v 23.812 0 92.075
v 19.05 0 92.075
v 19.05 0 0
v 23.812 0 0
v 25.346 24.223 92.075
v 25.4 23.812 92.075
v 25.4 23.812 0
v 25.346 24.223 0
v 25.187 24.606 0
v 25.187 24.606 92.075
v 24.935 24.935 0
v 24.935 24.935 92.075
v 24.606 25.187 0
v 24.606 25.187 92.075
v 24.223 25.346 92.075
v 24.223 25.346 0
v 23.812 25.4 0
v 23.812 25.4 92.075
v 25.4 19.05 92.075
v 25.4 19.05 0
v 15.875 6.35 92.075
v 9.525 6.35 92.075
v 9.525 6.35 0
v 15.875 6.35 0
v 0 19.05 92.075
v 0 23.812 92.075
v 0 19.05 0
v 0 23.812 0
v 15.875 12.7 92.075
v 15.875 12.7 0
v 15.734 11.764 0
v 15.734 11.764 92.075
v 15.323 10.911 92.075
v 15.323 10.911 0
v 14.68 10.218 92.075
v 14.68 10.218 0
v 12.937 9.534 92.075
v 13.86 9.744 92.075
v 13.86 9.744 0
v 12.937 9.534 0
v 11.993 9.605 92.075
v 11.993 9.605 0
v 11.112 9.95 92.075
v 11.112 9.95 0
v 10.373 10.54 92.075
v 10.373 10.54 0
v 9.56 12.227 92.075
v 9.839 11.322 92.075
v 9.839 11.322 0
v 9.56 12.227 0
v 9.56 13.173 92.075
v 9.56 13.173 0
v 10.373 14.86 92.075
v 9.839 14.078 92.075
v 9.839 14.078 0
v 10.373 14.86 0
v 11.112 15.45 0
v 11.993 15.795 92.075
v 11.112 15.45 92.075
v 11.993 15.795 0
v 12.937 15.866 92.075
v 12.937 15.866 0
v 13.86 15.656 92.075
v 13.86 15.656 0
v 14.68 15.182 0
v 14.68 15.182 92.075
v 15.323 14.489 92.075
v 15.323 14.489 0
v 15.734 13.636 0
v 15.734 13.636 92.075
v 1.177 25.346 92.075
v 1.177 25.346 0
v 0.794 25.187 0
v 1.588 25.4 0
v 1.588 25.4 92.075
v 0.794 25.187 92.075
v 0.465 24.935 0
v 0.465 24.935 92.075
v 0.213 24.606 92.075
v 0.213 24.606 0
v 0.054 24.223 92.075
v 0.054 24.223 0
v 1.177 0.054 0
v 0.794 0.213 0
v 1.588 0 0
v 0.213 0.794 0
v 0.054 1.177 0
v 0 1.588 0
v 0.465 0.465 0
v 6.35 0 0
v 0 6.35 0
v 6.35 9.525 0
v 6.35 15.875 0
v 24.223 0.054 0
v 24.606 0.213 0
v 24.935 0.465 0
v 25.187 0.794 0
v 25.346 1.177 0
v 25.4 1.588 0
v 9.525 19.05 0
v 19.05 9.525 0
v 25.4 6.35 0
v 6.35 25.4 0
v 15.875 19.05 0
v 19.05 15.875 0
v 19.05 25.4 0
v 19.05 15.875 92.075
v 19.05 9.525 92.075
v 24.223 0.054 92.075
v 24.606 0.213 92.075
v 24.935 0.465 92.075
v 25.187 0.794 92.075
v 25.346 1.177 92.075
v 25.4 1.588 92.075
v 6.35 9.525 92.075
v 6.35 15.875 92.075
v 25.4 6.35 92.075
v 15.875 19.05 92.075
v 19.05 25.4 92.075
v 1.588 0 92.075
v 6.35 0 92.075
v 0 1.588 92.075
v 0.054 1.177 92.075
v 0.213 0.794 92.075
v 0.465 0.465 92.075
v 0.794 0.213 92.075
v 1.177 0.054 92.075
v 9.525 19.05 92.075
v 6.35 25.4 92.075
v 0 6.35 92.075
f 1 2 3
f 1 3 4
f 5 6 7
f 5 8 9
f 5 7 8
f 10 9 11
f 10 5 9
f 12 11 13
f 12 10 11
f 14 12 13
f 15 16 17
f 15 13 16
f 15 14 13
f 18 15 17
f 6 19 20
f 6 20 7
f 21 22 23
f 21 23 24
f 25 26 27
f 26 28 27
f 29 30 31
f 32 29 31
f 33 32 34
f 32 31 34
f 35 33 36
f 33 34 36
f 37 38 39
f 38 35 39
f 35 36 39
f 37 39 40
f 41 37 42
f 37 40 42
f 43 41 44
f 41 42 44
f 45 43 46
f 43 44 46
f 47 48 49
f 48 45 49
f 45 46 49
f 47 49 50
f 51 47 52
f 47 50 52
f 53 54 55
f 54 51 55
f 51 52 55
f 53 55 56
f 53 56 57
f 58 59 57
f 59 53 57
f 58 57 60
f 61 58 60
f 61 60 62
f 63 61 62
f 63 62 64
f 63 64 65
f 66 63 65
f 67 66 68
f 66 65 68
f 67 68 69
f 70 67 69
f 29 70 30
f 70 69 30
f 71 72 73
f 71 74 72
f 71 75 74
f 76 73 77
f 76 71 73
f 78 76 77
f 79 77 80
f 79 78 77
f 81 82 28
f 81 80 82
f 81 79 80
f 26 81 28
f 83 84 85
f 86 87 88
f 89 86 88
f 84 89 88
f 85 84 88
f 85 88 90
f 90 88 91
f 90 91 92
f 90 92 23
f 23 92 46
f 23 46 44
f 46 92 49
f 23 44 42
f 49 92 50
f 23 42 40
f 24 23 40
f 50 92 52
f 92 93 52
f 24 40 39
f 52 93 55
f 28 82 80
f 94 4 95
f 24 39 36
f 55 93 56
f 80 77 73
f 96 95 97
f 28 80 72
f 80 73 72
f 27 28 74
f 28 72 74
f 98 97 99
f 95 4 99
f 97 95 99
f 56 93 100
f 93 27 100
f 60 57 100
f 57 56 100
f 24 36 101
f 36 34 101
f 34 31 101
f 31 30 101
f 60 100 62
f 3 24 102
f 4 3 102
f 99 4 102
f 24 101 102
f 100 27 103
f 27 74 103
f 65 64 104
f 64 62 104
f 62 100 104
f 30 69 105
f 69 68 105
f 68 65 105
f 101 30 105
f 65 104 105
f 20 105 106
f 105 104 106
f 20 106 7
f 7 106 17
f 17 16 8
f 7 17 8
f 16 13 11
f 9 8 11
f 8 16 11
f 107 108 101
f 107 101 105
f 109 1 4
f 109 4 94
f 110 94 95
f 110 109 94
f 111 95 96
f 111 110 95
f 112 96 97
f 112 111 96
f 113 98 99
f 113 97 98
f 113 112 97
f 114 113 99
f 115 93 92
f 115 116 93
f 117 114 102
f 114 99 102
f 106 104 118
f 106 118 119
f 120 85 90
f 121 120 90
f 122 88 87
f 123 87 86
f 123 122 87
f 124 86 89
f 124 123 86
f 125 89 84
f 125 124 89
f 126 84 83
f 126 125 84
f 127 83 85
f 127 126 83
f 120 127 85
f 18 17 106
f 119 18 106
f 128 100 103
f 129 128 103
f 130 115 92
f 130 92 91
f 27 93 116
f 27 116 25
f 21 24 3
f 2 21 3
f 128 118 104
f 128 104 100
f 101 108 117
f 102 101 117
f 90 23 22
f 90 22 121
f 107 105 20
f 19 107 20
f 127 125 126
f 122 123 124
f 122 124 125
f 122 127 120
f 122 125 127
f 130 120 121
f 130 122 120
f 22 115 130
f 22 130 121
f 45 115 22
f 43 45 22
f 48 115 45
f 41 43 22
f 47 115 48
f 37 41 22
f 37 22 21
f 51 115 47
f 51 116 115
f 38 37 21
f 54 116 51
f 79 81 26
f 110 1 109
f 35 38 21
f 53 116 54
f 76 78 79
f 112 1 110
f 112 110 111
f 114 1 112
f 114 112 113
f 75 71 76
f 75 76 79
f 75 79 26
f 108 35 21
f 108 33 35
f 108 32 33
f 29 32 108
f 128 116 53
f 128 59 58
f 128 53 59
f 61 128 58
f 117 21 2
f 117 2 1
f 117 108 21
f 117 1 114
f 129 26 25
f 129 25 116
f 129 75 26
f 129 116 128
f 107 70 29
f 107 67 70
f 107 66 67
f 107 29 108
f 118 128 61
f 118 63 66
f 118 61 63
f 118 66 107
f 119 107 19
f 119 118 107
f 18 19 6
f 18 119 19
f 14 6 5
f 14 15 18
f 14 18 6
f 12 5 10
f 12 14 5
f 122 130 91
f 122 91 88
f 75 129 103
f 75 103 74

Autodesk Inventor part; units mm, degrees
ref_plane "YZ Plane" through (0, 0, 0) normal (1, 0, 0) x (0, 1, 0)
ref_plane "XZ Plane" through (0, 0, 0) normal (0, 1, 0) x (-1, 0, 0)
ref_plane "XY Plane" through (0, 0, 0) normal (0, 0, 1) x (1, 0, 0)
sketch "Sketch1" plane through (0, 0, 0) normal (0, 0, 1) x (1, 0, 0)
  line L0 (0, 0) -> (25.4, 0)
  line L1 (25.4, 0) -> (25.4, 25.4)
  line L2 (25.4, 25.4) -> (0, 25.4)
  line L3 (0, 25.4) -> (0, 0)
  circle A0 centre (12.7, 12.7) radius 3.175
  dimension "d0" = 25.4
  dimension "d1" = 25.4
  dimension "d2" = 6.35
  dimension "d7" = 12.7
  dimension "d8" = 12.7
extrude "Extrusion1" add sketch "Sketch1" along normal blind 609.6
sketch "Sketch2" plane through (0, 0, 609.6) normal (0, 0, 1) x (1, 0, 0)
  line L0 (25.4, 25.4) -> (0, 25.4) projected
  line L1 (0, 25.4) -> (0, 0) projected
  circle A0 centre (12.7, 12.7) radius 3.175 projected
  line L2 (0, 0) -> (25.4, 0) projected
  line L3 (25.4, 0) -> (25.4, 25.4) projected
  line L4 (25.4, 25.4) -> (0, 25.4) projected
  line L5 (0, 25.4) -> (0, 0) projected
  line L6 (12.7, 19.05) -> (9.525, 19.05)
  line L7 (9.525, 19.05) -> (15.875, 19.05)
  line L8 (15.875, 19.05) -> (19.05, 25.4)
  line L9 (9.525, 19.05) -> (6.35, 25.4)
  dimension "d13" = 6.35
  dimension "d14" = 6.35
  dimension "d15" = 3.175
  dimension "d16" = 6.35
fillet "Fillet1" radius 1.5875 4 edges at (25.4, 25.4, 304.8) (0, 25.4, 304.8) (25.4, 0, 304.8) (0, 0, 304.8)
extrude "Extrusion2" cut sketch "Sketch2" against normal blind 609.6 contours L8 L7 L6 L9 L0
pattern_circular "Circular Pattern1" count 4 over 360 about axis through (12.7, 12.7, 0) along (0, 0, 1) of "Extrusion2"
sketch "Sketch3" plane through (0, 0, 609.6) normal (0, 0, 1) x (1, 0, 0)
  line L0 (19.05, 15.875) -> (25.4, 19.05) projected
  line L1 (25.4, 19.05) -> (25.4, 23.8125) projected
  arc A0 (25.4, 23.8125) -> (23.8125, 25.4) centre (23.8125, 23.8125) ccw projected
  line L2 (23.8125, 25.4) -> (19.05, 25.4) projected
  line L3 (19.05, 25.4) -> (15.875, 19.05) projected
  line L4 (15.875, 19.05) -> (9.525, 19.05) projected
  line L5 (9.525, 19.05) -> (6.35, 25.4) projected
  line L6 (6.35, 25.4) -> (1.5875, 25.4) projected
  arc A1 (1.5875, 25.4) -> (0, 23.8125) centre (1.5875, 23.8125) ccw projected
  line L7 (0, 23.8125) -> (0, 19.05) projected
  line L8 (0, 19.05) -> (6.35, 15.875) projected
  line L9 (6.35, 15.875) -> (6.35, 9.525) projected
  line L10 (6.35, 9.525) -> (0, 6.35) projected
  line L11 (0, 6.35) -> (0, 1.5875) projected
  arc A2 (0, 1.5875) -> (1.5875, 0) centre (1.5875, 1.5875) ccw projected
  line L12 (1.5875, 0) -> (6.35, 0) projected
  line L13 (6.35, 0) -> (9.525, 6.35) projected
  line L14 (9.525, 6.35) -> (15.875, 6.35) projected
  line L15 (15.875, 6.35) -> (19.05, 0) projected
  line L16 (19.05, 0) -> (23.8125, 0) projected
  arc A3 (23.8125, 0) -> (25.4, 1.5875) centre (23.8125, 1.5875) ccw projected
  line L17 (25.4, 1.5875) -> (25.4, 6.35) projected
  line L18 (25.4, 6.35) -> (19.05, 9.525) projected
  line L19 (19.05, 9.525) -> (19.05, 15.875) projected
  circle A4 centre (12.7, 12.7) radius 3.175 projected
  point P0 (0, 0)
extrude "Extrusion3" cut sketch "Sketch3" against normal blind 517.525
properties part number "Mock 8020 3.625in"
